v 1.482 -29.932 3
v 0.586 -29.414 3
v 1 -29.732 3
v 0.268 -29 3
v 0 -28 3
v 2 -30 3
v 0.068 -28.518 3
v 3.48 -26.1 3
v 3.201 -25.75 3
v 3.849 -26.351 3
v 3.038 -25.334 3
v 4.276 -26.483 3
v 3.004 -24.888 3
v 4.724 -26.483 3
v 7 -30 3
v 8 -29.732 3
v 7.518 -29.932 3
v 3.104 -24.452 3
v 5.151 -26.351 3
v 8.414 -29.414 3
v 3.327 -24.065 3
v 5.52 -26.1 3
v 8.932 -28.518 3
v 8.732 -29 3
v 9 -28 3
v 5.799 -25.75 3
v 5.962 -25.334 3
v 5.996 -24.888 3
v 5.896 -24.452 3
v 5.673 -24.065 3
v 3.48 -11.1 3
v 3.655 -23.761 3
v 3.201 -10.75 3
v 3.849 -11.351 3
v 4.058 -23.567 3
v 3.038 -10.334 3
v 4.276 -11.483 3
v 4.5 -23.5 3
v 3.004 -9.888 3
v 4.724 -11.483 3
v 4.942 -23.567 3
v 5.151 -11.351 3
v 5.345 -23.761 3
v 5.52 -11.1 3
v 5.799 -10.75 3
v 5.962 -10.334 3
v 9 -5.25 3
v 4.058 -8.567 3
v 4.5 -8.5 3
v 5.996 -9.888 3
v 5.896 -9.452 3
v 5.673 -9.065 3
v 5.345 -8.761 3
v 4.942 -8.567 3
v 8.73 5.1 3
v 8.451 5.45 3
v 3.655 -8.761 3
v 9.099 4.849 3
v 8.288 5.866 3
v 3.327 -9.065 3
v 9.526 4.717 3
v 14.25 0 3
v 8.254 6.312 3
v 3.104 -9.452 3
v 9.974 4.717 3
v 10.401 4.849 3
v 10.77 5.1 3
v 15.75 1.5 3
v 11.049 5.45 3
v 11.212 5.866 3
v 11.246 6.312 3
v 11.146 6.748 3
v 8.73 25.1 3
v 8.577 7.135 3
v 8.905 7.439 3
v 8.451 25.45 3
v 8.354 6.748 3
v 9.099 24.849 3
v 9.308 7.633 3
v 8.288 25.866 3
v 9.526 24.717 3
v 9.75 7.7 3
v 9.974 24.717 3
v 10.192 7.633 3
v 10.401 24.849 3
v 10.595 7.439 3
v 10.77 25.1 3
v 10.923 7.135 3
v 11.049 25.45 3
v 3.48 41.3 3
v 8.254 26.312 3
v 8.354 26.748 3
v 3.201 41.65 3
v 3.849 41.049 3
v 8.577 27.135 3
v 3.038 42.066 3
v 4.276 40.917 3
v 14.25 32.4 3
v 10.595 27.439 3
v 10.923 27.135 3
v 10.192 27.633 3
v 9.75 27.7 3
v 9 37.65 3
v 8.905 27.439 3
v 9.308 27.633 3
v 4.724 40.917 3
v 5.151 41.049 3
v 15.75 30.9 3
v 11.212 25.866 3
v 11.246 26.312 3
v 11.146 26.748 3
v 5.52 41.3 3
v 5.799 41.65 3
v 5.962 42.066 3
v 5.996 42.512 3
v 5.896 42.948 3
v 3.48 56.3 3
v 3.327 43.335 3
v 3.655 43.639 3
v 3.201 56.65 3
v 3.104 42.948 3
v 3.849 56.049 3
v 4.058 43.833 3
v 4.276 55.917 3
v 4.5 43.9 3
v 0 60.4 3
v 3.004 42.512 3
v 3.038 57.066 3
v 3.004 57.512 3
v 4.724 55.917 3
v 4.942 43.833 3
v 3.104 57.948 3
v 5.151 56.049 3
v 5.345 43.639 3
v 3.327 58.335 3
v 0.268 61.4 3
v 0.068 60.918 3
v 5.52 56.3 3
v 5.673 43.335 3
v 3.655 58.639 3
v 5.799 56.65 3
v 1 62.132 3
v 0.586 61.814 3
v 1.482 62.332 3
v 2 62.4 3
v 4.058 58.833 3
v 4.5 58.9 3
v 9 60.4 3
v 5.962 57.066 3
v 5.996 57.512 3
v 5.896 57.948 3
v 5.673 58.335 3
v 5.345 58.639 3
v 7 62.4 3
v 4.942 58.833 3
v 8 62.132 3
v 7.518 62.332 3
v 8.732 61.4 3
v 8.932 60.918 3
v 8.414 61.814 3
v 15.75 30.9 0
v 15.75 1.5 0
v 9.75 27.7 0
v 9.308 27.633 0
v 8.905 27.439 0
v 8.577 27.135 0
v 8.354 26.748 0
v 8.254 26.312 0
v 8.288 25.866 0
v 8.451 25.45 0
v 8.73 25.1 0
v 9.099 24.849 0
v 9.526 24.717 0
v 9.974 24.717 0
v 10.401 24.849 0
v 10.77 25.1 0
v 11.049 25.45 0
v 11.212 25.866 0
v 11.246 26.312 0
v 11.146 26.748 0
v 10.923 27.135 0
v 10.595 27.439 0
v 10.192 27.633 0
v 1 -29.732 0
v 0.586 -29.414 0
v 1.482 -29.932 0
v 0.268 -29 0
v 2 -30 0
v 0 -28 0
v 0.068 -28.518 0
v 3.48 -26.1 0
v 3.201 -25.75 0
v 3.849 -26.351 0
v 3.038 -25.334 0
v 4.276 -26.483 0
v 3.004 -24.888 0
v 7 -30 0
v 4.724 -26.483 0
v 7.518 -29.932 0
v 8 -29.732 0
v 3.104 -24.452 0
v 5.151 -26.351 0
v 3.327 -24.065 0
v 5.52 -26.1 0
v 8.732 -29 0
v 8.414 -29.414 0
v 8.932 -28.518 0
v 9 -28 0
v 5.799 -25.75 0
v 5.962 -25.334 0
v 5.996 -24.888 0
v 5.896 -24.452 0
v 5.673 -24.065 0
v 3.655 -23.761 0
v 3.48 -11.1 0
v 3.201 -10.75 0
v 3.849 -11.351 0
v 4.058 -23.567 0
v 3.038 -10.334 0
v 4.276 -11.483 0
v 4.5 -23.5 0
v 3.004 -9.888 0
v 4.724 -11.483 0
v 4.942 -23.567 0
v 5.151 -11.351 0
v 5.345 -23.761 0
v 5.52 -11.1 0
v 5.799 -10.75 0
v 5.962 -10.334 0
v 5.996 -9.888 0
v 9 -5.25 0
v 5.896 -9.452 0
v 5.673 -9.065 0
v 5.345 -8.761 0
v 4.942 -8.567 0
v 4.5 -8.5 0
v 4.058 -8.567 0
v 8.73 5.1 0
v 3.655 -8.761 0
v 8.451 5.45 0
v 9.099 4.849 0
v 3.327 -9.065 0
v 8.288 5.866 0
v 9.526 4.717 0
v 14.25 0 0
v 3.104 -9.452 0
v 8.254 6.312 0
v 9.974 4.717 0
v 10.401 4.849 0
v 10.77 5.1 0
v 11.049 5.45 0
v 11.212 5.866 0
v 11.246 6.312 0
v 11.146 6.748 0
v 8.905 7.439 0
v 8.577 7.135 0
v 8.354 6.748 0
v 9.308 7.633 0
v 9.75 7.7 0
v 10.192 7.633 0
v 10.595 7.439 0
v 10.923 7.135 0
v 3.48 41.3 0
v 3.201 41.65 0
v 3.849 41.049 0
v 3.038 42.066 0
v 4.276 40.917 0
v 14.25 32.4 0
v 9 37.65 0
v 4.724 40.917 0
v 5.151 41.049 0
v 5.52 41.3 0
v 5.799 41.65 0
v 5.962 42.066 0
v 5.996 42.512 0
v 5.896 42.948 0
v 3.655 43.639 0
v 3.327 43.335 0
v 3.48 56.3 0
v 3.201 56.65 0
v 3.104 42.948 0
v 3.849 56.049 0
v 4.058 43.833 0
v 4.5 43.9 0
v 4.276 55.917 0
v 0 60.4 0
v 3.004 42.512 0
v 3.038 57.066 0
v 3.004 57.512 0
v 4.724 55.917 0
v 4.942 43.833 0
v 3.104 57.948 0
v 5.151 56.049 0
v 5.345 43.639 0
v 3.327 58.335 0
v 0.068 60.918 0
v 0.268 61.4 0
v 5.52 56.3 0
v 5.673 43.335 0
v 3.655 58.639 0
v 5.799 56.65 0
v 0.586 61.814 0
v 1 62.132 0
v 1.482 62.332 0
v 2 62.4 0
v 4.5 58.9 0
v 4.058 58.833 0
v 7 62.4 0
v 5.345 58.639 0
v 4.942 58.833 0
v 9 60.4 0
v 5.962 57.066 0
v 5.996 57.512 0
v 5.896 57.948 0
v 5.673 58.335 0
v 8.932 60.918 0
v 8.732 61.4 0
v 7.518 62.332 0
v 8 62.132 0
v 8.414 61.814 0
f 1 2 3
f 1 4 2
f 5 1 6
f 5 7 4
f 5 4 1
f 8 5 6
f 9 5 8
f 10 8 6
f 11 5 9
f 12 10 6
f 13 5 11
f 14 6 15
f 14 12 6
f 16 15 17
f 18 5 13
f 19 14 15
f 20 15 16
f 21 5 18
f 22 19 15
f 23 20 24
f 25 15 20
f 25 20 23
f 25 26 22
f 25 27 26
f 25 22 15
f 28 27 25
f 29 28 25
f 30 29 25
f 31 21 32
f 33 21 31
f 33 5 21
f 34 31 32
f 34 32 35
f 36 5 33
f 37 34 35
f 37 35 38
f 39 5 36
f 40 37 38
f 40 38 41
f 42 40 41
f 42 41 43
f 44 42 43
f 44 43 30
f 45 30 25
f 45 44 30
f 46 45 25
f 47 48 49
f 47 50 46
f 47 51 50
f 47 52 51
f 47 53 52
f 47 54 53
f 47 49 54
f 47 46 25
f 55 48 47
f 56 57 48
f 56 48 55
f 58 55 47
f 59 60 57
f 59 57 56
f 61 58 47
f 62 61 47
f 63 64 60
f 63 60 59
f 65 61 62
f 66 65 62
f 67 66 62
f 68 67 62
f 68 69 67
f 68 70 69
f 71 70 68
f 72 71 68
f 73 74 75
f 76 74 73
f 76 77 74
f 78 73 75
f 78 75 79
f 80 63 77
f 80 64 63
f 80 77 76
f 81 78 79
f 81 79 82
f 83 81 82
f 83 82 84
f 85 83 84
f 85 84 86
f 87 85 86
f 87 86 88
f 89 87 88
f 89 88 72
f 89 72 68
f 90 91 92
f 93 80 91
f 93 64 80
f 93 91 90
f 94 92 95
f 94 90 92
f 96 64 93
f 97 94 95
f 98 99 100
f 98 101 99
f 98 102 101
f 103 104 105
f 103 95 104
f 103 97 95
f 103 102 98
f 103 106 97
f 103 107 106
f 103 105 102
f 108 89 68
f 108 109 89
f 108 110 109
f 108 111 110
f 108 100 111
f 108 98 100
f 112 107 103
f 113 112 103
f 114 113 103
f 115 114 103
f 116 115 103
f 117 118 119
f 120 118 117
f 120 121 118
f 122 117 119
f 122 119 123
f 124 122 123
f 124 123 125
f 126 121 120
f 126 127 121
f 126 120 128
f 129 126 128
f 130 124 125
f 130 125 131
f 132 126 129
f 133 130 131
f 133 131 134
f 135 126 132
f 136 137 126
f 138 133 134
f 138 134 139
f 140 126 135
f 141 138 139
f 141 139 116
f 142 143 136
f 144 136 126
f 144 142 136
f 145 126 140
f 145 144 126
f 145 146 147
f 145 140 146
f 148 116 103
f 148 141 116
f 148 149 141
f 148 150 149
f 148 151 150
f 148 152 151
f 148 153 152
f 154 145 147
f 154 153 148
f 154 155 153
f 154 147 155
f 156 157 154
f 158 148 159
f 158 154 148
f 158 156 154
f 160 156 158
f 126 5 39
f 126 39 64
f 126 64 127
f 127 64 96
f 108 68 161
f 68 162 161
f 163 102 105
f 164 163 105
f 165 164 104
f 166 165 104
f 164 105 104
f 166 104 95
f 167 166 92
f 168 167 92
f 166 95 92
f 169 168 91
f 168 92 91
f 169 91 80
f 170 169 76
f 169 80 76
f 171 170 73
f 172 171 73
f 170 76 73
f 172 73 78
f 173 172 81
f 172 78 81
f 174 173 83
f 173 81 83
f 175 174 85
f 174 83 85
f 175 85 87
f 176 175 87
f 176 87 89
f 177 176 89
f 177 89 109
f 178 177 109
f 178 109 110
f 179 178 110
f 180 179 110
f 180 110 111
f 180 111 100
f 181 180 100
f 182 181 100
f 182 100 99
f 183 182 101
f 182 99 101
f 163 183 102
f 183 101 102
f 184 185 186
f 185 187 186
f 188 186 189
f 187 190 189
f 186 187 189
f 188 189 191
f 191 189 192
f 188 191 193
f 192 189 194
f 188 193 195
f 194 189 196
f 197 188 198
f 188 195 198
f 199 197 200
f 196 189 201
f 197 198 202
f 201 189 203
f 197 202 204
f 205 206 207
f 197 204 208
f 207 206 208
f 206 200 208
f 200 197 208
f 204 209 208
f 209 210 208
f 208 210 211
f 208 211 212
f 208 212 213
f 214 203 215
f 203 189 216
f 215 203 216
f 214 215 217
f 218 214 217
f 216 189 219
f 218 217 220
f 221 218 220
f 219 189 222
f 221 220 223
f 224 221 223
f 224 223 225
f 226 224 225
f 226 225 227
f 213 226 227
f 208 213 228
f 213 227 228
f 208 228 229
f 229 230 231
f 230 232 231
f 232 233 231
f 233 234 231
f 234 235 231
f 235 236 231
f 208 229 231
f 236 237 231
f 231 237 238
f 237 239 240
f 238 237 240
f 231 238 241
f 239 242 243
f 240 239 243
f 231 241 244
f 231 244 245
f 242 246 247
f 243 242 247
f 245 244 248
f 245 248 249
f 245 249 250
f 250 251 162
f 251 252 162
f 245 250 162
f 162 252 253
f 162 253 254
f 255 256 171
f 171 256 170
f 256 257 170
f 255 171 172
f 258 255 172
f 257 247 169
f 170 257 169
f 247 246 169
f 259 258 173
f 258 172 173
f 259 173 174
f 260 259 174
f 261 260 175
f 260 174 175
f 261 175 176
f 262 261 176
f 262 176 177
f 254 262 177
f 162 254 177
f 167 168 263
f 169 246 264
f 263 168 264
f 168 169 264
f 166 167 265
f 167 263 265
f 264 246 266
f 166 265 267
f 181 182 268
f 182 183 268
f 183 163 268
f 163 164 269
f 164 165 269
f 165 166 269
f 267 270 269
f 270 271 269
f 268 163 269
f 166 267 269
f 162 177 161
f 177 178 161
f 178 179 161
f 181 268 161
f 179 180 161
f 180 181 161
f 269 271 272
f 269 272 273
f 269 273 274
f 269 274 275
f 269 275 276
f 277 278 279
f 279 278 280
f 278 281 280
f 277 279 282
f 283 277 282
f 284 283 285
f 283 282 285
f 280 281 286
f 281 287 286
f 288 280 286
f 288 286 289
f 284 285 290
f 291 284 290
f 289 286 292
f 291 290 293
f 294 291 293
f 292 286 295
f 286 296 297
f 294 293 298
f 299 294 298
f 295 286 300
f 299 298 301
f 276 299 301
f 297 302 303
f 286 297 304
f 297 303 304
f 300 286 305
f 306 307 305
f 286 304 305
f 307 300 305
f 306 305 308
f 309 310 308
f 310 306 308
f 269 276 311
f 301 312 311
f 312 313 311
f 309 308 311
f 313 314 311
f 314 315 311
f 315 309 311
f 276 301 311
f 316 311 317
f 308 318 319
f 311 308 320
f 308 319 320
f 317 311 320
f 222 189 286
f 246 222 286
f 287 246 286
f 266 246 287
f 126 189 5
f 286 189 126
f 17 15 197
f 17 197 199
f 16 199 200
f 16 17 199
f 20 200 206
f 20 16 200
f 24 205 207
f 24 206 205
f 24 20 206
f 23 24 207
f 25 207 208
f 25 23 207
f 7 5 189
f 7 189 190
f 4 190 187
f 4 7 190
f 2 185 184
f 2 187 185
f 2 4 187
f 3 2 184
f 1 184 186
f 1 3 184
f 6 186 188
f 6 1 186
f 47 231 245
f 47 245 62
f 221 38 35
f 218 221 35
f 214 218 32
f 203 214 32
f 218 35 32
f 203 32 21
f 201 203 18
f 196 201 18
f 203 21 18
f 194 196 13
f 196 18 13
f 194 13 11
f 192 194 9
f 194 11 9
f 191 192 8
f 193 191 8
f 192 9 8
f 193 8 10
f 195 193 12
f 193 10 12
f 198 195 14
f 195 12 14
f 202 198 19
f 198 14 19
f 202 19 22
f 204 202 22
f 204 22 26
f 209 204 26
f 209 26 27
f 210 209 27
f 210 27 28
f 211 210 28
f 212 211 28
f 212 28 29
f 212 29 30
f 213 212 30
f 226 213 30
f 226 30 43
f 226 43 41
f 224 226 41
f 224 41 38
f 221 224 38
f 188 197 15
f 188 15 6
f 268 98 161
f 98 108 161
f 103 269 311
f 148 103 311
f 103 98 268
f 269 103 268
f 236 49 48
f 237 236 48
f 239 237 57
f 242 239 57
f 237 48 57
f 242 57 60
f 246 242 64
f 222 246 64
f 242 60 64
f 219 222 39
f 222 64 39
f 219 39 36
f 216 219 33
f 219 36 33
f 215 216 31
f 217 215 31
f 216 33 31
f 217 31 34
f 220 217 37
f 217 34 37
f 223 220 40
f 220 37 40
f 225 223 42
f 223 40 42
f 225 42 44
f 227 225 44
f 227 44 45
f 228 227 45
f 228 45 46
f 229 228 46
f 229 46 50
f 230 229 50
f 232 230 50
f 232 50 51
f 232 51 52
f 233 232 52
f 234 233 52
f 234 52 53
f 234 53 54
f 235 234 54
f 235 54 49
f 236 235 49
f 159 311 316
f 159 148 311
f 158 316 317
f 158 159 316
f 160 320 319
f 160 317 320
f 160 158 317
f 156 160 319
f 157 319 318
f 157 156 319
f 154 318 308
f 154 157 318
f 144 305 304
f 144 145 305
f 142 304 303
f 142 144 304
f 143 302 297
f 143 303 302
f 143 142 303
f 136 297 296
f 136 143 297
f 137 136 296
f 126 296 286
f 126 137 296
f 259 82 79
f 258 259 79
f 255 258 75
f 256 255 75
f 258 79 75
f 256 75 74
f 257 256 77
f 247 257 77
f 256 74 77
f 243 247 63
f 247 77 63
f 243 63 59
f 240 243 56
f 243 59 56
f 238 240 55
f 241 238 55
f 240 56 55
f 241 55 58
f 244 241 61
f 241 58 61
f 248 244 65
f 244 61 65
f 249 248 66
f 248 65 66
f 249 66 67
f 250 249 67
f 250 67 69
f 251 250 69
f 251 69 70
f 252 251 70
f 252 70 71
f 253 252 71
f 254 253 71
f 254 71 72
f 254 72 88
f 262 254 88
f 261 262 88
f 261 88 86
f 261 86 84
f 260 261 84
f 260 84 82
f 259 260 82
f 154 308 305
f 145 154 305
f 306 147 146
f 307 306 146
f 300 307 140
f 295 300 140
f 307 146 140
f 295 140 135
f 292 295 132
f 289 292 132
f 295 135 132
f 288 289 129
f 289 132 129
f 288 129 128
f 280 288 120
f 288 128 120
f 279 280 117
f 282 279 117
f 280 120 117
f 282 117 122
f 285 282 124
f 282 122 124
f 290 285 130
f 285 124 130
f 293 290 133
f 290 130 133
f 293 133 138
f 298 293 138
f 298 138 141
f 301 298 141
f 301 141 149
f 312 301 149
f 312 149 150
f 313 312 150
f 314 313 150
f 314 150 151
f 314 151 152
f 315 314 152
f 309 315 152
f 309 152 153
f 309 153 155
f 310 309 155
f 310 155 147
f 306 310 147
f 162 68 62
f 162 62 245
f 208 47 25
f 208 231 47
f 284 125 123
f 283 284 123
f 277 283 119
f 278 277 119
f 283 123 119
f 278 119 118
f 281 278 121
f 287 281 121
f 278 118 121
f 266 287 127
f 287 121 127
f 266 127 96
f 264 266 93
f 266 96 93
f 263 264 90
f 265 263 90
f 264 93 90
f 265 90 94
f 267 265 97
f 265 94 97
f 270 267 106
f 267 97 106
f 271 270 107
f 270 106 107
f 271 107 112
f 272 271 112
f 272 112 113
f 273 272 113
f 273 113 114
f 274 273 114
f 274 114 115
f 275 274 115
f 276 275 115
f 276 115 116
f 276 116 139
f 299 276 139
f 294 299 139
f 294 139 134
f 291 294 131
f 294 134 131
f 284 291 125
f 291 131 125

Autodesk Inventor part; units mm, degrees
ref_plane "YZ Plane" through (0, 0, 0) normal (1, 0, 0) x (0, 1, 0)
ref_plane "XZ Plane" through (0, 0, 0) normal (0, 1, 0) x (-1, 0, 0)
ref_plane "XY Plane" through (0, 0, 0) normal (0, 0, 1) x (1, 0, 0)
sketch "Szkic1" plane through (0, 0, 0) normal (0, 0, 1) x (1, 0, 0)
  line L0 (0, 0) -> (15.75, 0)
  line L1 (15.75, 0) -> (15.75, 32.4)
  line L2 (0, 32.4) -> (15.75, 32.4)
  line L3 (0, 0) -> (0, 32.4)
  line L4 (0, 0) -> (9, 0)
  line L5 (9, 0) -> (9, -30)
  line L6 (9, -30) -> (0, -30)
  line L7 (0, -30) -> (0, 0)
  line L8 (0, 32.4) -> (9, 32.4)
  line L9 (9, 32.4) -> (9, 62.4)
  line L10 (9, 62.4) -> (0, 62.4)
  line L11 (0, 62.4) -> (0, 32.4)
  point P0 (15.1556, 0)
  point P1 (9.75, 26.2)
  point P2 (9.75, 6.2)
  point P3 (4.5, -25)
  point P4 (4.5, -10)
  point P5 (4.5, 42.4)
  point P6 (4.5, 57.4)
  dimension "d0" = 9.75
  dimension "d1" = 9.75
  dimension "d2" = 6.2
  dimension "d3" = 6.2
  dimension "d13" = 15.75
  dimension "d14" = 32.4
  dimension "d18" = 9
  dimension "d19" = 30
  dimension "d20" = 9
  dimension "d21" = 30
  dimension "d31" = 4.5
  dimension "d32" = 4.5
  dimension "d33" = 4.5
  dimension "d34" = 4.5
  dimension "d35" = 5
  dimension "d36" = 5
  dimension "d37" = 15
  dimension "d38" = 15
extrude "Wyciągnięcie proste1" add sketch "Szkic1" along normal blind 3 contours L3 L2 L1 L0
hole "Otwór1" at (9.75, 6.2, 0) at (9.75, 26.2, 0) direction (0, 0, 1) diameter 3 end through all
chamfer "Faza1" distance 1.5 angle 45 2 edges at (15.75, 0, 1.5) (15.75, 32.4, 1.5)
extrude "Wyciągnięcie proste2" add sketch "Szkic1" along normal blind 3 contours L0 L5 L6 L7 | L11 L10 L9 L2
chamfer "Faza2" distance 5.25 distance2 5.25 1 edges at (9, 32.4, 1.5) measured on face at (12.5, 32.4, 1)
chamfer "Faza3" distance 5.25 distance2 5.25 1 edges at (9, 0, 1.5) measured on face at (10.75, 0, 1)
fillet "Zaokrąglenie1" radius 2 4 edges at (9, -30, 1.5) (0, -30, 1.5) (9, 62.4, 1.5) (0, 62.4, 1.5)
hole "Otwór2" at (4.5, -25, 0) at (4.5, -10, 0) at (4.5, 42.4, 0) at (4.5, 57.4, 0) direction (0, 0, 1) diameter 3 end through all
equation "\"d1\" = d0"
equation "\"d3\" = d2"
equation "\"d18\" = d20"
equation "\"d19\" = d21"
equation "\"d35\" = d36"
properties part number "LC_ALU_3mm_X_Axis_Carriage_Accesory_Mounting_Bracket"
